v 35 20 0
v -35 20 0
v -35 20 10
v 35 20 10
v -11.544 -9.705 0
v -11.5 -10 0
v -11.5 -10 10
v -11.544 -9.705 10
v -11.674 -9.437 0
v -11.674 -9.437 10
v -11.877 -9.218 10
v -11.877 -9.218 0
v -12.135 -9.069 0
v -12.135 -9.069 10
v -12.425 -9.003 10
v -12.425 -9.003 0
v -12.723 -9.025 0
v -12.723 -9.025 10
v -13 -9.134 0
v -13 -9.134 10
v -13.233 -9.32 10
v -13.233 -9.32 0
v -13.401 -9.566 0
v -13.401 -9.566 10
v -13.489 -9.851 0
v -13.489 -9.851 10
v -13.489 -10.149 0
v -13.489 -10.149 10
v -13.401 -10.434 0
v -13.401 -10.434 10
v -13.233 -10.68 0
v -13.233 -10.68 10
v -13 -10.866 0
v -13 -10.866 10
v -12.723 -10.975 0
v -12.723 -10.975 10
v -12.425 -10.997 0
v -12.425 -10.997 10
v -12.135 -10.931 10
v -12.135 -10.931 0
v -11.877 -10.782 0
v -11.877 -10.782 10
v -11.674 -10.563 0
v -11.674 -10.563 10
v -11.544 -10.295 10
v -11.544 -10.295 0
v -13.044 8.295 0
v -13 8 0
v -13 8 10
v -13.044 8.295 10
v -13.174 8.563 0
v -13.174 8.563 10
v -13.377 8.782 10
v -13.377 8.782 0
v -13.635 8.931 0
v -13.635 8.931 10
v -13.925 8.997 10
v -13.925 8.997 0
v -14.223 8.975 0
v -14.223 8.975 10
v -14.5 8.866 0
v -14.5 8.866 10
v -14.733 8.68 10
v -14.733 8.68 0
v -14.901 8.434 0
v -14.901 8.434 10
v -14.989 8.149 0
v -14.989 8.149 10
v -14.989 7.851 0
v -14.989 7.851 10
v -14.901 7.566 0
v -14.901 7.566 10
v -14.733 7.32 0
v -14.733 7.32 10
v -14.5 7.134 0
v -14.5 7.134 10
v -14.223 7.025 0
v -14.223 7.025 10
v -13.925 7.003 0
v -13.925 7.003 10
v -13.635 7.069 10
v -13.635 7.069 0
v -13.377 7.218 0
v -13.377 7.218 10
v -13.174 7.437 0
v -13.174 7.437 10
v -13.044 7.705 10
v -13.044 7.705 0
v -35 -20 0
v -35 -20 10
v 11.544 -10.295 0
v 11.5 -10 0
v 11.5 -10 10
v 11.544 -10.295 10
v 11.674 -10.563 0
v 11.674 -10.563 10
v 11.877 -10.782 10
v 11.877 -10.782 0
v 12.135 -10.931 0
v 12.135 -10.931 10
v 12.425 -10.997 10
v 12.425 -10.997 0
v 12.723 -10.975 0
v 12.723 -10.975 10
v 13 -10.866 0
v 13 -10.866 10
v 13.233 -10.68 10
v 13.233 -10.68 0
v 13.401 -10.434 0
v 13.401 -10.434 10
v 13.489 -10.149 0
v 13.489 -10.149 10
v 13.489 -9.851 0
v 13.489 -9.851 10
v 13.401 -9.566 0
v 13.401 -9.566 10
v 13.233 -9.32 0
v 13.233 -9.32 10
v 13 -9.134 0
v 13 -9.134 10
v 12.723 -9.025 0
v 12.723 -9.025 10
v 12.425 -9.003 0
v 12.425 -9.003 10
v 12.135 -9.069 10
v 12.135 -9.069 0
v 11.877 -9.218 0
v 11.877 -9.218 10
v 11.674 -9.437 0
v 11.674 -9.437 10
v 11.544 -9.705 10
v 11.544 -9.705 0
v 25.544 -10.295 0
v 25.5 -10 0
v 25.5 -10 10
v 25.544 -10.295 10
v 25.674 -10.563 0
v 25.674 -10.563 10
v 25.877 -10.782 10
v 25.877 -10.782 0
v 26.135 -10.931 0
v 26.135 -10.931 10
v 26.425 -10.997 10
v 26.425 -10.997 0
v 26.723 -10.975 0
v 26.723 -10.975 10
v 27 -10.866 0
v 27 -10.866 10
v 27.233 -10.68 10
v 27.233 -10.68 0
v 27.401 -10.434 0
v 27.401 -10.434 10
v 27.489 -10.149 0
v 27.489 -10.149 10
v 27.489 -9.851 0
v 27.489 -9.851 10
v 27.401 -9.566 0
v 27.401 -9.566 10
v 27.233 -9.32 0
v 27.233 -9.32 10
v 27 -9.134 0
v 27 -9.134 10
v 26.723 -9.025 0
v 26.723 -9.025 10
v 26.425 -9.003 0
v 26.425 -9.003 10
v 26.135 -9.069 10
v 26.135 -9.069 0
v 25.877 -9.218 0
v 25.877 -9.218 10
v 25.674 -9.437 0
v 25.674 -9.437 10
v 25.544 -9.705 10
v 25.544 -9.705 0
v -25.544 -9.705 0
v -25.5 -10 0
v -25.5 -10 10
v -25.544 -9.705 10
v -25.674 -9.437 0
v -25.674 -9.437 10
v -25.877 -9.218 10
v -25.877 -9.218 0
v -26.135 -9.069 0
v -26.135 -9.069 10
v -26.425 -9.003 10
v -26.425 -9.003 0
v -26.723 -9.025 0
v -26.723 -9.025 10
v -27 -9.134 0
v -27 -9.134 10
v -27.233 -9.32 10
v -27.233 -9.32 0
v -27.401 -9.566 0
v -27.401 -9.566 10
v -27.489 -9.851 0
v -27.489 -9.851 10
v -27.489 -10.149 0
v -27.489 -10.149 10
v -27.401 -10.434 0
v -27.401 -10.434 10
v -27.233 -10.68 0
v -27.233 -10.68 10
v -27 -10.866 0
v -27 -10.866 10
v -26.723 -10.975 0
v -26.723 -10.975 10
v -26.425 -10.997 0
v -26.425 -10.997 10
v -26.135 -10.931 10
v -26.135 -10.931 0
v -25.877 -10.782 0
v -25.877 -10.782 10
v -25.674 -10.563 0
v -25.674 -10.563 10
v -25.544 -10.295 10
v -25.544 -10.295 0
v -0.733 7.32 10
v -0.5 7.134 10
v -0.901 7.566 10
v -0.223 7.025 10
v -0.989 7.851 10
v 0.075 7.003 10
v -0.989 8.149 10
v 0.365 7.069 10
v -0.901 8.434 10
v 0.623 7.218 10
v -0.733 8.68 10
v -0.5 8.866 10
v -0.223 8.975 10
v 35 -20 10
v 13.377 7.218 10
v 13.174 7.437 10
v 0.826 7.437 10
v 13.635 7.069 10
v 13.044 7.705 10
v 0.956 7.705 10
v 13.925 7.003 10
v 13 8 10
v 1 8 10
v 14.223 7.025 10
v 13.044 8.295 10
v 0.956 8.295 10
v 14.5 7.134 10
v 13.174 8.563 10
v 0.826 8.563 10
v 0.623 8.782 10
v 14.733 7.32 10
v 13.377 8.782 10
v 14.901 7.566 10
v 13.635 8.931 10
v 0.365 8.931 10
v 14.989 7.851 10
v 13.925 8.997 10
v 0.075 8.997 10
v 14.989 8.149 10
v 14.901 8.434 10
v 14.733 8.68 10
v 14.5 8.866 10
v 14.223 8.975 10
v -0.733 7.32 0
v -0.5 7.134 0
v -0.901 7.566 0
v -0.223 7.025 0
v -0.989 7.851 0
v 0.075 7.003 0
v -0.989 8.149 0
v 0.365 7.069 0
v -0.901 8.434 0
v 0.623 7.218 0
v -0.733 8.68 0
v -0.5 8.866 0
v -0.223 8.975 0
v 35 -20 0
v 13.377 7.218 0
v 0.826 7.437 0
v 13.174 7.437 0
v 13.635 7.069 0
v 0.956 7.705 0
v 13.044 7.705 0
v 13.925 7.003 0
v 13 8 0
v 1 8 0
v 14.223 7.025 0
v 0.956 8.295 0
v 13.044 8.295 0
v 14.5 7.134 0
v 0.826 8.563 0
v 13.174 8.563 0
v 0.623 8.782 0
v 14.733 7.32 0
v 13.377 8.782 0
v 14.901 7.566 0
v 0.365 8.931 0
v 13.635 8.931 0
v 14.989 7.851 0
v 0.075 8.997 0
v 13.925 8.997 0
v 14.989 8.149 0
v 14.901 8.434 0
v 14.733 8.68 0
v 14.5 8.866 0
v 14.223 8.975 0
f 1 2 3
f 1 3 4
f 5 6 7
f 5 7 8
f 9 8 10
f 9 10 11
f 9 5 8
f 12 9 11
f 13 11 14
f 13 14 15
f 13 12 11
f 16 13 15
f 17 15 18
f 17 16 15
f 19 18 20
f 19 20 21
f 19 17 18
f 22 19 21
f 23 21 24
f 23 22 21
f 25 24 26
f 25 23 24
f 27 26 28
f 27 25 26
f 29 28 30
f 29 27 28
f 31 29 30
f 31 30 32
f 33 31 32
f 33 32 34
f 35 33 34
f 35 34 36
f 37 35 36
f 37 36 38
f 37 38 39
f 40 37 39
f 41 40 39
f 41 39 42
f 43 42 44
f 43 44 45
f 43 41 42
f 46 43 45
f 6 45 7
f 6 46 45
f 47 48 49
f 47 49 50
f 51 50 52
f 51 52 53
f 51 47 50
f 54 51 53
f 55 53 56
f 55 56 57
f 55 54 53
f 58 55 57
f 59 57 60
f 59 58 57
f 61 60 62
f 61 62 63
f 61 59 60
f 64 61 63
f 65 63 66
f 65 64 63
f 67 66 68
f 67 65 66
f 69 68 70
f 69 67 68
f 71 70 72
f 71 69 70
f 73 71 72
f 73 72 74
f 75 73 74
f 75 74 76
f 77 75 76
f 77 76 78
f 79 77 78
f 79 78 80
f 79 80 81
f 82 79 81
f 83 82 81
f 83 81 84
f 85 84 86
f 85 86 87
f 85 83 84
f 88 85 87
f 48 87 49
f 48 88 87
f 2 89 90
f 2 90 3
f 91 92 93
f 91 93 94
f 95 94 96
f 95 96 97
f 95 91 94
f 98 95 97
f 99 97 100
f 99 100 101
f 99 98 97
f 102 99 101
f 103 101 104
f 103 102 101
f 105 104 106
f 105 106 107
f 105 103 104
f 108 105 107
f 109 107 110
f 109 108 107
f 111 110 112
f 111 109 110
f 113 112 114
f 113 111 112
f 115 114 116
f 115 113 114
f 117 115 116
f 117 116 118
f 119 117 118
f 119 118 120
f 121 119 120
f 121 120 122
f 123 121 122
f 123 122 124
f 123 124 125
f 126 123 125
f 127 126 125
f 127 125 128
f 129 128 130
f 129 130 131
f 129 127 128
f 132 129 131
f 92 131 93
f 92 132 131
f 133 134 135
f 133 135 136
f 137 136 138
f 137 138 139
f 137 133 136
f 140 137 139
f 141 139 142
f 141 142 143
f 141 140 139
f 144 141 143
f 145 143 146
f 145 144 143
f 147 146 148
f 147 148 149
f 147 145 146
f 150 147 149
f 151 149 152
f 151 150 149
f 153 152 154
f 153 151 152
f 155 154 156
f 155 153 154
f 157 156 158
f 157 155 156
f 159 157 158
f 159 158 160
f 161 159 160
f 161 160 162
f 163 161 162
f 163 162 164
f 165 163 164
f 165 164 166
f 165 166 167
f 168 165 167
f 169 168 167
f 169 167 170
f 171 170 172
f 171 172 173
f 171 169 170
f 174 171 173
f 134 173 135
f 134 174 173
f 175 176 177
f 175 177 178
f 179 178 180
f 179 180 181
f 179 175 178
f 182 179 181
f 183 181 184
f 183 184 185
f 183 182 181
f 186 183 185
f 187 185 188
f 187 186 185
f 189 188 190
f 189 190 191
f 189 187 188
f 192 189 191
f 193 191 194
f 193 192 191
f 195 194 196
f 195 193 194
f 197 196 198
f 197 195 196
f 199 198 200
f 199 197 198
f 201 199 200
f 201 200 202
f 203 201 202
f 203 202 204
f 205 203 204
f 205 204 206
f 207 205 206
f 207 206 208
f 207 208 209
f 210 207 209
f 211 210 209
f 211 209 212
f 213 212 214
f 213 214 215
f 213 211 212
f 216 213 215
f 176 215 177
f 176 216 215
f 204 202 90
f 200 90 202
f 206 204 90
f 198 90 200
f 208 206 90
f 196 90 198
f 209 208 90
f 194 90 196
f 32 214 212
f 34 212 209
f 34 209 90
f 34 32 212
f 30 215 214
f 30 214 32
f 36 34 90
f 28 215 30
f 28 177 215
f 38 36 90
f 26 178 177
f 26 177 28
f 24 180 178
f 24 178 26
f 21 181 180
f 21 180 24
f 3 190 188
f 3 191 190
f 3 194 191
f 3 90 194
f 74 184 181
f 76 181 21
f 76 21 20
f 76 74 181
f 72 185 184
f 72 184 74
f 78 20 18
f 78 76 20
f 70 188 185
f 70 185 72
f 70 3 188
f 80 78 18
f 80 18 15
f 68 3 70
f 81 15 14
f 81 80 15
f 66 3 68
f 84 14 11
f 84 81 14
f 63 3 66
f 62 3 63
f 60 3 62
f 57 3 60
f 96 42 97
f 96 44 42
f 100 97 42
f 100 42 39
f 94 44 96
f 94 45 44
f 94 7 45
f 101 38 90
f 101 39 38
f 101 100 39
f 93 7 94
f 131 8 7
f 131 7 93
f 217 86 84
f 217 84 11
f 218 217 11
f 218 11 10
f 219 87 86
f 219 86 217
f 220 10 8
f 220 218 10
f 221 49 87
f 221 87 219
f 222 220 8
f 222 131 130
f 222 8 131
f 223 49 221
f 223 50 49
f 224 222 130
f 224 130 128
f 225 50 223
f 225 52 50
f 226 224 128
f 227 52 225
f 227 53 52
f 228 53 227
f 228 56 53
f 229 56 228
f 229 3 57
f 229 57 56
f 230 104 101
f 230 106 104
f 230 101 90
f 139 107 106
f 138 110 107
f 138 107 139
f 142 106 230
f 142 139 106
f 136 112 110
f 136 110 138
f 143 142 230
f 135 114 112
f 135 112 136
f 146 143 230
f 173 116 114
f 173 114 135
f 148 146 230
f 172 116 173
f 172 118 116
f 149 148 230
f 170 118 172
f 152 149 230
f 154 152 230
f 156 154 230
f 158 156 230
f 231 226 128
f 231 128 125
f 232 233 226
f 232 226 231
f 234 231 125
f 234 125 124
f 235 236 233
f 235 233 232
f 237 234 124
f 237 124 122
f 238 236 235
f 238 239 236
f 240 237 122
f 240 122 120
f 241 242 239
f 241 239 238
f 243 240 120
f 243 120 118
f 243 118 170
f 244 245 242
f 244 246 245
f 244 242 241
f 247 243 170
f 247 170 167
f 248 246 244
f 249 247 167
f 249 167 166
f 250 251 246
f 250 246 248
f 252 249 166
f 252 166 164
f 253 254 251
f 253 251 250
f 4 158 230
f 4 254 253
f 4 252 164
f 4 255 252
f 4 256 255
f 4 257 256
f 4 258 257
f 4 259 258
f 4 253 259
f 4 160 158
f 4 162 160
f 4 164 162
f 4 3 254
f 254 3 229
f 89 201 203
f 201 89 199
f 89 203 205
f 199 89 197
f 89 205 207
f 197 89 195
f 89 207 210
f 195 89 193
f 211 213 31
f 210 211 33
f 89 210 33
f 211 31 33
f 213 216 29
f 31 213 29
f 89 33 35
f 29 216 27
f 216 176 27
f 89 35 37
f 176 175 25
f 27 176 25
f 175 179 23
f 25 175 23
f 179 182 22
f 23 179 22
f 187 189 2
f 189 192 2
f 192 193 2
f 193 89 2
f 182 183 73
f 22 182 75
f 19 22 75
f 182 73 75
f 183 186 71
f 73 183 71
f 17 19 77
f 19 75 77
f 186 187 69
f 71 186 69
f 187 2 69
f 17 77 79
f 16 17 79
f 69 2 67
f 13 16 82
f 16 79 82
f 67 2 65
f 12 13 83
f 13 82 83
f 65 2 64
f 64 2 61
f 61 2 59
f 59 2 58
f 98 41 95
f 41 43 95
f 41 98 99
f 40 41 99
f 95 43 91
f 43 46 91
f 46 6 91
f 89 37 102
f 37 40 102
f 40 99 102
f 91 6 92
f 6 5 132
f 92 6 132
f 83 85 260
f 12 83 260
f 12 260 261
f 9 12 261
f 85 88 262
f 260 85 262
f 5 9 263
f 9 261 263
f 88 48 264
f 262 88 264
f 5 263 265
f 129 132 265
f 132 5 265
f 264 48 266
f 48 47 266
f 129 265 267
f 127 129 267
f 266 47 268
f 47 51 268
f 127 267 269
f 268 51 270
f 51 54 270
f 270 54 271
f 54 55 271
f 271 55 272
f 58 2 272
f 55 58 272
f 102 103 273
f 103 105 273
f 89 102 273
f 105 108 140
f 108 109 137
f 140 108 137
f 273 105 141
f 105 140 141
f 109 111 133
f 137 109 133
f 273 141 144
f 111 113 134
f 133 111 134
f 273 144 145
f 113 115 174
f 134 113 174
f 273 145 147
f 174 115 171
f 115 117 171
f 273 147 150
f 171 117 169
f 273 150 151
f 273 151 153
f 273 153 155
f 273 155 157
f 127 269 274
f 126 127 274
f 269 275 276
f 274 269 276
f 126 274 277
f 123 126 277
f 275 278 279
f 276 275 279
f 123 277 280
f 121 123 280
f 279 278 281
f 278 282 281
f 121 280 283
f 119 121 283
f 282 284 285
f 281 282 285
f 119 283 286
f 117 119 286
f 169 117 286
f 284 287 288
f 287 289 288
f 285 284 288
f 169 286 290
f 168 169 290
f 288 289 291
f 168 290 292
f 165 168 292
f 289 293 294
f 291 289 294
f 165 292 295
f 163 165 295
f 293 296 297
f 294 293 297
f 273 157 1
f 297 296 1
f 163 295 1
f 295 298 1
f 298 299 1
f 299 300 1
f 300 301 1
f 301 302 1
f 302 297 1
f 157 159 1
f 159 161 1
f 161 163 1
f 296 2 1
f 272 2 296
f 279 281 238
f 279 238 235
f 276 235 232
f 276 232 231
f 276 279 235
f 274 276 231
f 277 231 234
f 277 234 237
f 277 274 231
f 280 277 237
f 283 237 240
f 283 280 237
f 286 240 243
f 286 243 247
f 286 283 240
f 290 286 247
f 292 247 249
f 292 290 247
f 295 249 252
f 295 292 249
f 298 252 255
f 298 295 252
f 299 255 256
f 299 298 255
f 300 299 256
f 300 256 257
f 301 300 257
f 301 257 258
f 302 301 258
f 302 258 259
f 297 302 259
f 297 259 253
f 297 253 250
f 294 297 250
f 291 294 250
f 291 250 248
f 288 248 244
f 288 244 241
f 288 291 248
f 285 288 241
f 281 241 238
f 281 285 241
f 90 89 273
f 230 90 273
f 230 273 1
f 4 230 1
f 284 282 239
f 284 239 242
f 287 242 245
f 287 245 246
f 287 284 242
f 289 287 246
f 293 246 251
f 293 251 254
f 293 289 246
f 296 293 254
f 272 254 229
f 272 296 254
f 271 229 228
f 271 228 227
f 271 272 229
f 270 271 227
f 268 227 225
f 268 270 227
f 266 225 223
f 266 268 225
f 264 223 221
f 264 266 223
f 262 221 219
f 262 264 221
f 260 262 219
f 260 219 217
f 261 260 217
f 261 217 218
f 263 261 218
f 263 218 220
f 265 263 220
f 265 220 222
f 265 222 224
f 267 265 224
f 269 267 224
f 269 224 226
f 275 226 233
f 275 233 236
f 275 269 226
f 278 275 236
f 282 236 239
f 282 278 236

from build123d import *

# Parameters (mm, degrees)
SKETCH1_W           = 70
SKETCH1_H           = 40
SKETCH1_R           = 1
BOSS_EXTRUDE1_DEPTH = 10


with BuildPart() as part:
    # Sketch1 → Boss-Extrude1 (new body)
    with BuildSketch(Plane.XY):
        Rectangle(SKETCH1_W, SKETCH1_H)
        with Locations((-14, 8)):
            Circle(SKETCH1_R, mode=Mode.SUBTRACT)
        with Locations(Location((14, 8, 0), (0, 0, 180))):
            Circle(SKETCH1_R, mode=Mode.SUBTRACT)
        with Locations((0, 8)):
            Circle(SKETCH1_R, mode=Mode.SUBTRACT)
        with Locations((-26.5, -10)):
            Circle(SKETCH1_R, mode=Mode.SUBTRACT)
        with Locations((-12.5, -10)):
            Circle(SKETCH1_R, mode=Mode.SUBTRACT)
        with Locations(Location((26.5, -10, 0), (0, 0, 180))):
            Circle(SKETCH1_R, mode=Mode.SUBTRACT)
        with Locations(Location((12.5, -10, 0), (0, 0, 180))):
            Circle(SKETCH1_R, mode=Mode.SUBTRACT)
    extrude(amount=BOSS_EXTRUDE1_DEPTH)


solid = part.part
